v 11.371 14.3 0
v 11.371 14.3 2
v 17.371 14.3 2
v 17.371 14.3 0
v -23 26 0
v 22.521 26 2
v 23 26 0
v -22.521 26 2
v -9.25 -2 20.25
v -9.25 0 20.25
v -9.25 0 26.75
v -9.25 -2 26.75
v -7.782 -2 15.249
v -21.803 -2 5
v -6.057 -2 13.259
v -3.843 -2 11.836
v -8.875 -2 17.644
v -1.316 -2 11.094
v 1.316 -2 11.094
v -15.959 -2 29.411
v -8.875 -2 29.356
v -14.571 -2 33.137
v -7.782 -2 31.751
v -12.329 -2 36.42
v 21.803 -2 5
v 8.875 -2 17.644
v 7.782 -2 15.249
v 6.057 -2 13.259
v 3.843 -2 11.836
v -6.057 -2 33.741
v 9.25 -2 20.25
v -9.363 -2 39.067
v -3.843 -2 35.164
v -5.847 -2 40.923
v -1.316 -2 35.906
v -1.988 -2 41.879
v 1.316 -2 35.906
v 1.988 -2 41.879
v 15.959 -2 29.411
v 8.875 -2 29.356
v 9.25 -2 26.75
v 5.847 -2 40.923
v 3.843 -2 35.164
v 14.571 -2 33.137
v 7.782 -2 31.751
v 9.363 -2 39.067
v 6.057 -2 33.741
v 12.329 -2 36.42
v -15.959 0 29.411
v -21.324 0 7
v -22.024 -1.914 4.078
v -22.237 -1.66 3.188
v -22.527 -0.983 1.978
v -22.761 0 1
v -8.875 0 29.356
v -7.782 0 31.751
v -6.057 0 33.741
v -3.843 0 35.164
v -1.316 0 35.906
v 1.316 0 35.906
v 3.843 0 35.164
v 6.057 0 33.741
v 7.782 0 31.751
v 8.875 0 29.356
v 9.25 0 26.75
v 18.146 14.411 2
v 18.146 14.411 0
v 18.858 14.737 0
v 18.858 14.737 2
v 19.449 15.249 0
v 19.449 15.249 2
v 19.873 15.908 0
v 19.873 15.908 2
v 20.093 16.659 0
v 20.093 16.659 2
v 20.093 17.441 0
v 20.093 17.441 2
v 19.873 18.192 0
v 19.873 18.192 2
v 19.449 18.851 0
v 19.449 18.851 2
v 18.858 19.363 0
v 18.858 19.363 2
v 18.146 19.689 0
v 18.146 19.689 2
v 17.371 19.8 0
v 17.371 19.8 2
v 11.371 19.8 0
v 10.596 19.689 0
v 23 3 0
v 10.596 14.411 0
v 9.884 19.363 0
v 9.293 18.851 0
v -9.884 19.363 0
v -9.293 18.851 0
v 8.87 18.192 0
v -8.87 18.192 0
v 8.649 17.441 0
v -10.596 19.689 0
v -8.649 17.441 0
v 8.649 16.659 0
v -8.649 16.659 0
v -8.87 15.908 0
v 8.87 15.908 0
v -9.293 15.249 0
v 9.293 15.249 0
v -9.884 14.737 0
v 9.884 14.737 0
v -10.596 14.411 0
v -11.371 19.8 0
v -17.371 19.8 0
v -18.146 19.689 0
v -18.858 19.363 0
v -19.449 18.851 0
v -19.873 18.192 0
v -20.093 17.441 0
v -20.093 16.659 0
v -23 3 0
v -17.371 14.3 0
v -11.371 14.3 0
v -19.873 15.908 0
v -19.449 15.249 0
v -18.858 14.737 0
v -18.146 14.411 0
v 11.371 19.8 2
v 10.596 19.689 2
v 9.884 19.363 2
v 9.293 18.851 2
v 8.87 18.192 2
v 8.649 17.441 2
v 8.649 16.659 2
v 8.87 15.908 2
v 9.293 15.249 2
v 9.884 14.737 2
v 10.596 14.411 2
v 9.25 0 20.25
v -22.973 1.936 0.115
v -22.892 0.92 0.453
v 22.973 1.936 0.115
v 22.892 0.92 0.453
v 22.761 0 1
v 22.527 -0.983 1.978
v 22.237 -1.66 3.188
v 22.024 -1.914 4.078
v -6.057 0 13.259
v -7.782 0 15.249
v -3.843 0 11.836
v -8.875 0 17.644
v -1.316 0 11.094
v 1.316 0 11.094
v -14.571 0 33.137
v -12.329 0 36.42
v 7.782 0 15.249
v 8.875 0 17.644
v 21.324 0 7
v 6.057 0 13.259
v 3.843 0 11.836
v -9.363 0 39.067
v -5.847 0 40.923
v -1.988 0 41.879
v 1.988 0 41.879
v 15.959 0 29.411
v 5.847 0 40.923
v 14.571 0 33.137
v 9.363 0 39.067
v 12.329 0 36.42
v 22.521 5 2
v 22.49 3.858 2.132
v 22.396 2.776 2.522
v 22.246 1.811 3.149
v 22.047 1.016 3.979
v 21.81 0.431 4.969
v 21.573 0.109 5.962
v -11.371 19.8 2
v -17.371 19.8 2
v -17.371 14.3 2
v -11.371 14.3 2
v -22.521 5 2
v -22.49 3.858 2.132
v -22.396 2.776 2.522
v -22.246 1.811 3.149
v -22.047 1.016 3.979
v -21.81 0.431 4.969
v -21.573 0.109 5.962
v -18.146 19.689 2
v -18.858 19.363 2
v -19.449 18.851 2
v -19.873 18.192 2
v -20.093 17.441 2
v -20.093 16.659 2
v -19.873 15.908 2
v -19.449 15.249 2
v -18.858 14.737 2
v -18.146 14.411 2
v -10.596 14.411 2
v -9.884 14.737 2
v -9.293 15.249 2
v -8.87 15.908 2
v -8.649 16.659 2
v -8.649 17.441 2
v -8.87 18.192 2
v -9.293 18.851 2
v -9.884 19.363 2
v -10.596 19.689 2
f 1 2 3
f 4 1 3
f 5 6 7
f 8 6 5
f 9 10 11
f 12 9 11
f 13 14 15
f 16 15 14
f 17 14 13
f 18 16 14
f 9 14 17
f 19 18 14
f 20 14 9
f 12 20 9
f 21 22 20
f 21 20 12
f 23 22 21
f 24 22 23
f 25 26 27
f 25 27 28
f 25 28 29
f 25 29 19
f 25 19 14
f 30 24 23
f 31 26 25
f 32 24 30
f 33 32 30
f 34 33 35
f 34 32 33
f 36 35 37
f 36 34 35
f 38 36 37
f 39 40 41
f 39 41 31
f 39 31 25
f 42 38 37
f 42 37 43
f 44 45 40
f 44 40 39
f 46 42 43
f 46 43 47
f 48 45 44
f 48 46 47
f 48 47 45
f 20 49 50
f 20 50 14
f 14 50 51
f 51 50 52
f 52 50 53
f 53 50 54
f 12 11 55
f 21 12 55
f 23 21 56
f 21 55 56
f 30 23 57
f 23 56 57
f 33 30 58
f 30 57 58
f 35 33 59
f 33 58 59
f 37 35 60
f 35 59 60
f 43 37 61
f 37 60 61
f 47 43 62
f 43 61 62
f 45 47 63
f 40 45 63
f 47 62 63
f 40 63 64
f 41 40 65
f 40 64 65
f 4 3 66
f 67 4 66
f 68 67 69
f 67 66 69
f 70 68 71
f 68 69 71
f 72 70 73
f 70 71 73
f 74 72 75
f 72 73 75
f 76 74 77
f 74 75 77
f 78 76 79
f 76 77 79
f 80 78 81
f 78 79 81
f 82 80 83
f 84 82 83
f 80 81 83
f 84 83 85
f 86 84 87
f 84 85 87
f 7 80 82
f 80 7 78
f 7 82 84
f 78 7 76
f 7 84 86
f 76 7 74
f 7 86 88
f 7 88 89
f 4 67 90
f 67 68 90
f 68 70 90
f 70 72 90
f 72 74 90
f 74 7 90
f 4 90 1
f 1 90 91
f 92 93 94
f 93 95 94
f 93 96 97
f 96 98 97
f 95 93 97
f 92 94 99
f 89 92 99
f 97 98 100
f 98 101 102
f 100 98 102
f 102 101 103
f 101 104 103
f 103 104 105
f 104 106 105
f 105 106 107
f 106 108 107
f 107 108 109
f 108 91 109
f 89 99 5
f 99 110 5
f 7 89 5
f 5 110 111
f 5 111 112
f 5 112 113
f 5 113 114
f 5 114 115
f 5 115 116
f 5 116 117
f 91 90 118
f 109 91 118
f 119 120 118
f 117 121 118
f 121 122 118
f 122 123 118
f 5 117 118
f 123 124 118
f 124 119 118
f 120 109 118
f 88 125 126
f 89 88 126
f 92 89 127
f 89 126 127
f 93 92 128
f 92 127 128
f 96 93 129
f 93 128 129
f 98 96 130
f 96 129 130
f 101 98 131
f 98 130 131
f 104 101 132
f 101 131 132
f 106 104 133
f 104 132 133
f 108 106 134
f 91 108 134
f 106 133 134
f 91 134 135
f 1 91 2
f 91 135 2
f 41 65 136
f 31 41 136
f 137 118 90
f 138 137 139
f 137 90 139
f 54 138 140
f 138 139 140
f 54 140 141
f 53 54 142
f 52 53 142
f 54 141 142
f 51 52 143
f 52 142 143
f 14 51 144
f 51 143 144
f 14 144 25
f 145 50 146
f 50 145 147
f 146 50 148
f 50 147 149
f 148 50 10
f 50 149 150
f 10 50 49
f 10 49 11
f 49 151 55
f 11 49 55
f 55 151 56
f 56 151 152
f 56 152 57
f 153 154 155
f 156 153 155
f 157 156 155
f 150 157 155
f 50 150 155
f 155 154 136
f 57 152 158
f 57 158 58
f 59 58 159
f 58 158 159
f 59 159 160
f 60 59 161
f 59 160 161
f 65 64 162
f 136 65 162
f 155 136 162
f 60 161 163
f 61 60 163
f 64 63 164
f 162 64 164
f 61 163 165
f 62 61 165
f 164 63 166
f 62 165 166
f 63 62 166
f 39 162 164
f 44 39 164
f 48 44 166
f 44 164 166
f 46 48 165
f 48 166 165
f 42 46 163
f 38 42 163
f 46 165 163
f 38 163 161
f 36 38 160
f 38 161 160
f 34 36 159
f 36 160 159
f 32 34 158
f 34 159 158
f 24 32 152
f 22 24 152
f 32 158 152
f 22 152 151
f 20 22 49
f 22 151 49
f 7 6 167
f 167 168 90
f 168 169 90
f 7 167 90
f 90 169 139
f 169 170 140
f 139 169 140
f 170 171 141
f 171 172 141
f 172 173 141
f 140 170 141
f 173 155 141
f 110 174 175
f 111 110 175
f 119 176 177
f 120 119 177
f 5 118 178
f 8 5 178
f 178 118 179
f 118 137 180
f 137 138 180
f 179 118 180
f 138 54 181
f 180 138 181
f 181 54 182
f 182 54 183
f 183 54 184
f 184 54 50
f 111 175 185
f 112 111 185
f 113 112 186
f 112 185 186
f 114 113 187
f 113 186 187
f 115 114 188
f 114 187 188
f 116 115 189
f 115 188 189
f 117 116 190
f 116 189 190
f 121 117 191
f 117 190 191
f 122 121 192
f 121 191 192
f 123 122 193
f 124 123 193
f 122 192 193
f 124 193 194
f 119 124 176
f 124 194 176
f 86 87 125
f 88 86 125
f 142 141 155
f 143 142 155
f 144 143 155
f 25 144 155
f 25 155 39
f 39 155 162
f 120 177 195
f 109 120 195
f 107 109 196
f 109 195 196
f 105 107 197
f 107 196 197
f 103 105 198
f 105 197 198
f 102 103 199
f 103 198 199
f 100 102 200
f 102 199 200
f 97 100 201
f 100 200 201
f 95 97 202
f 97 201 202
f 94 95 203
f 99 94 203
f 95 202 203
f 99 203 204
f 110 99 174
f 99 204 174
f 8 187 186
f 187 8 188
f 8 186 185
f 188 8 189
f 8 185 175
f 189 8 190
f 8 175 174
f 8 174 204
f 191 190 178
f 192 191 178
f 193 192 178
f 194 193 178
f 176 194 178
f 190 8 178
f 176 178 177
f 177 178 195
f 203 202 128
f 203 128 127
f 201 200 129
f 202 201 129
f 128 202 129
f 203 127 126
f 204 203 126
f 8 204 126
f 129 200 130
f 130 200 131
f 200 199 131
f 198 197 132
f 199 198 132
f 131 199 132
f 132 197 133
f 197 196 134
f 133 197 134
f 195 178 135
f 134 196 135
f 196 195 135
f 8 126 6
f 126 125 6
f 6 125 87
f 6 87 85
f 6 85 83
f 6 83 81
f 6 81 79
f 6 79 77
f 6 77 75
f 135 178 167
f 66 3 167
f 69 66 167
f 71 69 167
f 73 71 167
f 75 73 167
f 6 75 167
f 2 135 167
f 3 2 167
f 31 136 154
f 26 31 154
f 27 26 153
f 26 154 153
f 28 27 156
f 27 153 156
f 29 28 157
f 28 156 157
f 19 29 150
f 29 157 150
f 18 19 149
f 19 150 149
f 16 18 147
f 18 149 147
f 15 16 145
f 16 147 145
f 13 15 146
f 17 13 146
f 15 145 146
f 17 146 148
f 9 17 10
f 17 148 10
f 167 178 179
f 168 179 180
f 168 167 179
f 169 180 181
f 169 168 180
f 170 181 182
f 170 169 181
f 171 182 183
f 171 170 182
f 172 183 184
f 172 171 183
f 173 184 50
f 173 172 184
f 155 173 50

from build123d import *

# Parameters (mm, degrees)
F1_DEPTH = 2
F3_DEPTH = 26
F4_R     = 5
F6_DEPTH = 2.001


with BuildPart() as f1:
    # F0 (on Front) → F1 (new body)
    with BuildSketch(Plane.XZ):
        with BuildLine():
            Line((-15.958655, 29.411045), (-23, 0))
            Line((-23, 0), (23, 0))
            Line((23, 0), (15.958655, 29.411045))
            ThreePointArc((15.958655, 29.411045), (0, 42), (-15.958655, 29.411045))
        make_face()
        with BuildLine():
            Line((-9.25, 20.25), (-9.25, 26.75))
            ThreePointArc((-9.25, 26.75), (0, 36), (9.25, 26.75))
            Line((9.25, 26.75), (9.25, 20.25))
            ThreePointArc((9.25, 20.25), (0, 11), (-9.25, 20.25))
        make_face(mode=Mode.SUBTRACT)
    extrude(amount=F1_DEPTH)

    # F2 (on face) → F3 (join)
    with BuildSketch(Plane(origin=(0, 0, 0), x_dir=(-1, 0, 0), z_dir=(0, 1, 0))):
        Polygon((22.521177, 2), (-22.521177, 2), (-23, 0), (23, 0), align=None)
    extrude(amount=F3_DEPTH)

    # F4
    f4_edges = [f1.edges().sort_by_distance(p)[0] for p in [
        (0, -2, 0),
        (0, 0, 2),
    ]]
    fillet(f4_edges, radius=F4_R)

    # F5 (on face) → F6 (cut, through all)
    with BuildSketch(Plane.XY.offset(2)):
        with BuildLine():
            Line((17.371177, 19.8), (11.371177, 19.8))
            ThreePointArc((11.371177, 19.8), (8.621177, 17.05), (11.371177, 14.3))
            Line((11.371177, 14.3), (17.371177, 14.3))
            ThreePointArc((17.371177, 14.3), (20.121177, 17.05), (17.371177, 19.8))
        make_face()
        with BuildLine():
            Line((-17.371177, 14.3), (-11.371177, 14.3))
            ThreePointArc((-11.371177, 14.3), (-8.621177, 17.05), (-11.371177, 19.8))
            Line((-11.371177, 19.8), (-17.371177, 19.8))
            ThreePointArc((-17.371177, 19.8), (-20.121177, 17.05), (-17.371177, 14.3))
        make_face()
    extrude(amount=-F6_DEPTH, mode=Mode.SUBTRACT)


solid = f1.part
